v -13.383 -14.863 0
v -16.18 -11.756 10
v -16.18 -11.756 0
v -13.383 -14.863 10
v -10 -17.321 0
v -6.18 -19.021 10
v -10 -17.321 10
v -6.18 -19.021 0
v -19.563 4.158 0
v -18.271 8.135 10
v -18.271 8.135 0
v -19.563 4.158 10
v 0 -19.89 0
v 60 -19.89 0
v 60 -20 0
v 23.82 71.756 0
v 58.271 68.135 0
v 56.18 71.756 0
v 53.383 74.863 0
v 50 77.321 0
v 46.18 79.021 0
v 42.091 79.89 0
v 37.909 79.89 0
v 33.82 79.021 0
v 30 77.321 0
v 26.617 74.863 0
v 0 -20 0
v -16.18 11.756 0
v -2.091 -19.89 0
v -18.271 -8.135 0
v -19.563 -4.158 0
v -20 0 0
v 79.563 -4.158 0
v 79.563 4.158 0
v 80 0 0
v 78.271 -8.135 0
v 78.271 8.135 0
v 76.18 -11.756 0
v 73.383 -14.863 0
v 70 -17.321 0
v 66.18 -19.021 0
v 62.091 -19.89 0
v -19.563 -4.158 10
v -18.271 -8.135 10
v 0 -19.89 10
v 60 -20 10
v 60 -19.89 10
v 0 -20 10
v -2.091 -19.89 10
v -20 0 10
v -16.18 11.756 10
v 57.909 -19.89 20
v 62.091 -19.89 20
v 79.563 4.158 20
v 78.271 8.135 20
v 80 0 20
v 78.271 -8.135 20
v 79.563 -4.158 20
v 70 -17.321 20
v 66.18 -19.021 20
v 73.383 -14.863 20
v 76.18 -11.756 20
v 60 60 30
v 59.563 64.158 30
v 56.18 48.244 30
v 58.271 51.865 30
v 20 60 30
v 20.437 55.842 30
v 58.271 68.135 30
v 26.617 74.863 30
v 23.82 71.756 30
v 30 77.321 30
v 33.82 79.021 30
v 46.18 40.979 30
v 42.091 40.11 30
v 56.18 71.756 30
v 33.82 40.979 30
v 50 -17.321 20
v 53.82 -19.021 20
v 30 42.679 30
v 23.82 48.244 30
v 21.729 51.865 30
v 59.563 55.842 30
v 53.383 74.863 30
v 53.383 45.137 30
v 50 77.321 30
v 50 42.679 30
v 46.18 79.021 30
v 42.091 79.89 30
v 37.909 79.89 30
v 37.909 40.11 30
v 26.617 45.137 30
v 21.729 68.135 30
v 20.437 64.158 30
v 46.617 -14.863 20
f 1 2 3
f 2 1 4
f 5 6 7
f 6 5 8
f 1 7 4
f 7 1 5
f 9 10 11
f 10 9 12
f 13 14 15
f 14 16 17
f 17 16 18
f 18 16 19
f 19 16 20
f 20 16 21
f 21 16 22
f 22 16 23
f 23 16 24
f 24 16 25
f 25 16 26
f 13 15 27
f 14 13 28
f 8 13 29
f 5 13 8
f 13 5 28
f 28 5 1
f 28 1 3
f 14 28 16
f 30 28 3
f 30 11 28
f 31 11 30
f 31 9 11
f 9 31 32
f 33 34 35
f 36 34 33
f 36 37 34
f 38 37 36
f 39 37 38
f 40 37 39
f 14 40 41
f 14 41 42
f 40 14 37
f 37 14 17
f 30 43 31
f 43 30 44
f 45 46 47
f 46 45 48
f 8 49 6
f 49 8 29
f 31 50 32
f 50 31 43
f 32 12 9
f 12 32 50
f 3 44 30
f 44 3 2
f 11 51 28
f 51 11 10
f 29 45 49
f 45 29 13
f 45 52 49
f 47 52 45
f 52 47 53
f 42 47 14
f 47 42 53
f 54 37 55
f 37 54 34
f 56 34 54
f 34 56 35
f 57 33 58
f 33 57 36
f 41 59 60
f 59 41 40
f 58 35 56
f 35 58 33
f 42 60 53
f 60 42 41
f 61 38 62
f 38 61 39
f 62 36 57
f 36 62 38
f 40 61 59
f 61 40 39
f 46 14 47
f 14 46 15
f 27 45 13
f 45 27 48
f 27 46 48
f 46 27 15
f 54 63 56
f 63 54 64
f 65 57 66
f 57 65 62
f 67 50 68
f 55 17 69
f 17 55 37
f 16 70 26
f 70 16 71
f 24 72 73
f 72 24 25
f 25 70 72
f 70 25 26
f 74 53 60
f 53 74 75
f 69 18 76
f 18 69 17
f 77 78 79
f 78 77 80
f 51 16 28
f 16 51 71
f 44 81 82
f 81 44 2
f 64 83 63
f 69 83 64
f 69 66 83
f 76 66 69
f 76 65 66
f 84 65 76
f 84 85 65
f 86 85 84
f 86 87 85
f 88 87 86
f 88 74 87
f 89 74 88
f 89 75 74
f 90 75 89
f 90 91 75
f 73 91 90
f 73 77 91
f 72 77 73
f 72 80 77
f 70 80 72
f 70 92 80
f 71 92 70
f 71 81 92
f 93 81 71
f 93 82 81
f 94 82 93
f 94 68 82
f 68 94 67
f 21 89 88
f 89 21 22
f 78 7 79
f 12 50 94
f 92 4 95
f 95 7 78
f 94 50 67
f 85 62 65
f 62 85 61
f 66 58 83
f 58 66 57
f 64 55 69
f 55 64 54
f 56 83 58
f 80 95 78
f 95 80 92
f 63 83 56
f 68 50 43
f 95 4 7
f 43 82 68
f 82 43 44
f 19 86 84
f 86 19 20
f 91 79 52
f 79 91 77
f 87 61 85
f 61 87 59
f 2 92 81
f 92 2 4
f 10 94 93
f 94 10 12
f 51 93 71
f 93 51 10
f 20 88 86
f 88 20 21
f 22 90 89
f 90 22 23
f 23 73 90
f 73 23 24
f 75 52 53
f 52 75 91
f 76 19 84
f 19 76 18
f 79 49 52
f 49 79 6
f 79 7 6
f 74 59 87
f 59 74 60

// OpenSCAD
module placa_snowbord(grosime, raza, lungime)
{

cylinder(h=grosime,r=raza);

translate([lungime - 2 * raza,0,0])
cylinder(h=grosime,r=raza);
   translate([0, -raza, 0]) cube([lungime - 2 * raza, 2*raza,grosime]);
}
placa_snowbord(grosime=10, raza=20, lungime=100);
//.......
module podium(grosime, raza, lungime)
{
    hull(){

cylinder(h=grosime,r=raza);

translate([lungime - 2 * raza,0,0])
cylinder(h= 2 *grosime, r = raza);
   translate([(lungime - raza) / 2, lungime-2*raza, 0])
        cylinder(h=3*grosime,r=raza);
   
}
}
//placa_snowbord(grosime=10, raza=20, lungime=100);
podium(grosime=10,raza=20,lungime=100);
